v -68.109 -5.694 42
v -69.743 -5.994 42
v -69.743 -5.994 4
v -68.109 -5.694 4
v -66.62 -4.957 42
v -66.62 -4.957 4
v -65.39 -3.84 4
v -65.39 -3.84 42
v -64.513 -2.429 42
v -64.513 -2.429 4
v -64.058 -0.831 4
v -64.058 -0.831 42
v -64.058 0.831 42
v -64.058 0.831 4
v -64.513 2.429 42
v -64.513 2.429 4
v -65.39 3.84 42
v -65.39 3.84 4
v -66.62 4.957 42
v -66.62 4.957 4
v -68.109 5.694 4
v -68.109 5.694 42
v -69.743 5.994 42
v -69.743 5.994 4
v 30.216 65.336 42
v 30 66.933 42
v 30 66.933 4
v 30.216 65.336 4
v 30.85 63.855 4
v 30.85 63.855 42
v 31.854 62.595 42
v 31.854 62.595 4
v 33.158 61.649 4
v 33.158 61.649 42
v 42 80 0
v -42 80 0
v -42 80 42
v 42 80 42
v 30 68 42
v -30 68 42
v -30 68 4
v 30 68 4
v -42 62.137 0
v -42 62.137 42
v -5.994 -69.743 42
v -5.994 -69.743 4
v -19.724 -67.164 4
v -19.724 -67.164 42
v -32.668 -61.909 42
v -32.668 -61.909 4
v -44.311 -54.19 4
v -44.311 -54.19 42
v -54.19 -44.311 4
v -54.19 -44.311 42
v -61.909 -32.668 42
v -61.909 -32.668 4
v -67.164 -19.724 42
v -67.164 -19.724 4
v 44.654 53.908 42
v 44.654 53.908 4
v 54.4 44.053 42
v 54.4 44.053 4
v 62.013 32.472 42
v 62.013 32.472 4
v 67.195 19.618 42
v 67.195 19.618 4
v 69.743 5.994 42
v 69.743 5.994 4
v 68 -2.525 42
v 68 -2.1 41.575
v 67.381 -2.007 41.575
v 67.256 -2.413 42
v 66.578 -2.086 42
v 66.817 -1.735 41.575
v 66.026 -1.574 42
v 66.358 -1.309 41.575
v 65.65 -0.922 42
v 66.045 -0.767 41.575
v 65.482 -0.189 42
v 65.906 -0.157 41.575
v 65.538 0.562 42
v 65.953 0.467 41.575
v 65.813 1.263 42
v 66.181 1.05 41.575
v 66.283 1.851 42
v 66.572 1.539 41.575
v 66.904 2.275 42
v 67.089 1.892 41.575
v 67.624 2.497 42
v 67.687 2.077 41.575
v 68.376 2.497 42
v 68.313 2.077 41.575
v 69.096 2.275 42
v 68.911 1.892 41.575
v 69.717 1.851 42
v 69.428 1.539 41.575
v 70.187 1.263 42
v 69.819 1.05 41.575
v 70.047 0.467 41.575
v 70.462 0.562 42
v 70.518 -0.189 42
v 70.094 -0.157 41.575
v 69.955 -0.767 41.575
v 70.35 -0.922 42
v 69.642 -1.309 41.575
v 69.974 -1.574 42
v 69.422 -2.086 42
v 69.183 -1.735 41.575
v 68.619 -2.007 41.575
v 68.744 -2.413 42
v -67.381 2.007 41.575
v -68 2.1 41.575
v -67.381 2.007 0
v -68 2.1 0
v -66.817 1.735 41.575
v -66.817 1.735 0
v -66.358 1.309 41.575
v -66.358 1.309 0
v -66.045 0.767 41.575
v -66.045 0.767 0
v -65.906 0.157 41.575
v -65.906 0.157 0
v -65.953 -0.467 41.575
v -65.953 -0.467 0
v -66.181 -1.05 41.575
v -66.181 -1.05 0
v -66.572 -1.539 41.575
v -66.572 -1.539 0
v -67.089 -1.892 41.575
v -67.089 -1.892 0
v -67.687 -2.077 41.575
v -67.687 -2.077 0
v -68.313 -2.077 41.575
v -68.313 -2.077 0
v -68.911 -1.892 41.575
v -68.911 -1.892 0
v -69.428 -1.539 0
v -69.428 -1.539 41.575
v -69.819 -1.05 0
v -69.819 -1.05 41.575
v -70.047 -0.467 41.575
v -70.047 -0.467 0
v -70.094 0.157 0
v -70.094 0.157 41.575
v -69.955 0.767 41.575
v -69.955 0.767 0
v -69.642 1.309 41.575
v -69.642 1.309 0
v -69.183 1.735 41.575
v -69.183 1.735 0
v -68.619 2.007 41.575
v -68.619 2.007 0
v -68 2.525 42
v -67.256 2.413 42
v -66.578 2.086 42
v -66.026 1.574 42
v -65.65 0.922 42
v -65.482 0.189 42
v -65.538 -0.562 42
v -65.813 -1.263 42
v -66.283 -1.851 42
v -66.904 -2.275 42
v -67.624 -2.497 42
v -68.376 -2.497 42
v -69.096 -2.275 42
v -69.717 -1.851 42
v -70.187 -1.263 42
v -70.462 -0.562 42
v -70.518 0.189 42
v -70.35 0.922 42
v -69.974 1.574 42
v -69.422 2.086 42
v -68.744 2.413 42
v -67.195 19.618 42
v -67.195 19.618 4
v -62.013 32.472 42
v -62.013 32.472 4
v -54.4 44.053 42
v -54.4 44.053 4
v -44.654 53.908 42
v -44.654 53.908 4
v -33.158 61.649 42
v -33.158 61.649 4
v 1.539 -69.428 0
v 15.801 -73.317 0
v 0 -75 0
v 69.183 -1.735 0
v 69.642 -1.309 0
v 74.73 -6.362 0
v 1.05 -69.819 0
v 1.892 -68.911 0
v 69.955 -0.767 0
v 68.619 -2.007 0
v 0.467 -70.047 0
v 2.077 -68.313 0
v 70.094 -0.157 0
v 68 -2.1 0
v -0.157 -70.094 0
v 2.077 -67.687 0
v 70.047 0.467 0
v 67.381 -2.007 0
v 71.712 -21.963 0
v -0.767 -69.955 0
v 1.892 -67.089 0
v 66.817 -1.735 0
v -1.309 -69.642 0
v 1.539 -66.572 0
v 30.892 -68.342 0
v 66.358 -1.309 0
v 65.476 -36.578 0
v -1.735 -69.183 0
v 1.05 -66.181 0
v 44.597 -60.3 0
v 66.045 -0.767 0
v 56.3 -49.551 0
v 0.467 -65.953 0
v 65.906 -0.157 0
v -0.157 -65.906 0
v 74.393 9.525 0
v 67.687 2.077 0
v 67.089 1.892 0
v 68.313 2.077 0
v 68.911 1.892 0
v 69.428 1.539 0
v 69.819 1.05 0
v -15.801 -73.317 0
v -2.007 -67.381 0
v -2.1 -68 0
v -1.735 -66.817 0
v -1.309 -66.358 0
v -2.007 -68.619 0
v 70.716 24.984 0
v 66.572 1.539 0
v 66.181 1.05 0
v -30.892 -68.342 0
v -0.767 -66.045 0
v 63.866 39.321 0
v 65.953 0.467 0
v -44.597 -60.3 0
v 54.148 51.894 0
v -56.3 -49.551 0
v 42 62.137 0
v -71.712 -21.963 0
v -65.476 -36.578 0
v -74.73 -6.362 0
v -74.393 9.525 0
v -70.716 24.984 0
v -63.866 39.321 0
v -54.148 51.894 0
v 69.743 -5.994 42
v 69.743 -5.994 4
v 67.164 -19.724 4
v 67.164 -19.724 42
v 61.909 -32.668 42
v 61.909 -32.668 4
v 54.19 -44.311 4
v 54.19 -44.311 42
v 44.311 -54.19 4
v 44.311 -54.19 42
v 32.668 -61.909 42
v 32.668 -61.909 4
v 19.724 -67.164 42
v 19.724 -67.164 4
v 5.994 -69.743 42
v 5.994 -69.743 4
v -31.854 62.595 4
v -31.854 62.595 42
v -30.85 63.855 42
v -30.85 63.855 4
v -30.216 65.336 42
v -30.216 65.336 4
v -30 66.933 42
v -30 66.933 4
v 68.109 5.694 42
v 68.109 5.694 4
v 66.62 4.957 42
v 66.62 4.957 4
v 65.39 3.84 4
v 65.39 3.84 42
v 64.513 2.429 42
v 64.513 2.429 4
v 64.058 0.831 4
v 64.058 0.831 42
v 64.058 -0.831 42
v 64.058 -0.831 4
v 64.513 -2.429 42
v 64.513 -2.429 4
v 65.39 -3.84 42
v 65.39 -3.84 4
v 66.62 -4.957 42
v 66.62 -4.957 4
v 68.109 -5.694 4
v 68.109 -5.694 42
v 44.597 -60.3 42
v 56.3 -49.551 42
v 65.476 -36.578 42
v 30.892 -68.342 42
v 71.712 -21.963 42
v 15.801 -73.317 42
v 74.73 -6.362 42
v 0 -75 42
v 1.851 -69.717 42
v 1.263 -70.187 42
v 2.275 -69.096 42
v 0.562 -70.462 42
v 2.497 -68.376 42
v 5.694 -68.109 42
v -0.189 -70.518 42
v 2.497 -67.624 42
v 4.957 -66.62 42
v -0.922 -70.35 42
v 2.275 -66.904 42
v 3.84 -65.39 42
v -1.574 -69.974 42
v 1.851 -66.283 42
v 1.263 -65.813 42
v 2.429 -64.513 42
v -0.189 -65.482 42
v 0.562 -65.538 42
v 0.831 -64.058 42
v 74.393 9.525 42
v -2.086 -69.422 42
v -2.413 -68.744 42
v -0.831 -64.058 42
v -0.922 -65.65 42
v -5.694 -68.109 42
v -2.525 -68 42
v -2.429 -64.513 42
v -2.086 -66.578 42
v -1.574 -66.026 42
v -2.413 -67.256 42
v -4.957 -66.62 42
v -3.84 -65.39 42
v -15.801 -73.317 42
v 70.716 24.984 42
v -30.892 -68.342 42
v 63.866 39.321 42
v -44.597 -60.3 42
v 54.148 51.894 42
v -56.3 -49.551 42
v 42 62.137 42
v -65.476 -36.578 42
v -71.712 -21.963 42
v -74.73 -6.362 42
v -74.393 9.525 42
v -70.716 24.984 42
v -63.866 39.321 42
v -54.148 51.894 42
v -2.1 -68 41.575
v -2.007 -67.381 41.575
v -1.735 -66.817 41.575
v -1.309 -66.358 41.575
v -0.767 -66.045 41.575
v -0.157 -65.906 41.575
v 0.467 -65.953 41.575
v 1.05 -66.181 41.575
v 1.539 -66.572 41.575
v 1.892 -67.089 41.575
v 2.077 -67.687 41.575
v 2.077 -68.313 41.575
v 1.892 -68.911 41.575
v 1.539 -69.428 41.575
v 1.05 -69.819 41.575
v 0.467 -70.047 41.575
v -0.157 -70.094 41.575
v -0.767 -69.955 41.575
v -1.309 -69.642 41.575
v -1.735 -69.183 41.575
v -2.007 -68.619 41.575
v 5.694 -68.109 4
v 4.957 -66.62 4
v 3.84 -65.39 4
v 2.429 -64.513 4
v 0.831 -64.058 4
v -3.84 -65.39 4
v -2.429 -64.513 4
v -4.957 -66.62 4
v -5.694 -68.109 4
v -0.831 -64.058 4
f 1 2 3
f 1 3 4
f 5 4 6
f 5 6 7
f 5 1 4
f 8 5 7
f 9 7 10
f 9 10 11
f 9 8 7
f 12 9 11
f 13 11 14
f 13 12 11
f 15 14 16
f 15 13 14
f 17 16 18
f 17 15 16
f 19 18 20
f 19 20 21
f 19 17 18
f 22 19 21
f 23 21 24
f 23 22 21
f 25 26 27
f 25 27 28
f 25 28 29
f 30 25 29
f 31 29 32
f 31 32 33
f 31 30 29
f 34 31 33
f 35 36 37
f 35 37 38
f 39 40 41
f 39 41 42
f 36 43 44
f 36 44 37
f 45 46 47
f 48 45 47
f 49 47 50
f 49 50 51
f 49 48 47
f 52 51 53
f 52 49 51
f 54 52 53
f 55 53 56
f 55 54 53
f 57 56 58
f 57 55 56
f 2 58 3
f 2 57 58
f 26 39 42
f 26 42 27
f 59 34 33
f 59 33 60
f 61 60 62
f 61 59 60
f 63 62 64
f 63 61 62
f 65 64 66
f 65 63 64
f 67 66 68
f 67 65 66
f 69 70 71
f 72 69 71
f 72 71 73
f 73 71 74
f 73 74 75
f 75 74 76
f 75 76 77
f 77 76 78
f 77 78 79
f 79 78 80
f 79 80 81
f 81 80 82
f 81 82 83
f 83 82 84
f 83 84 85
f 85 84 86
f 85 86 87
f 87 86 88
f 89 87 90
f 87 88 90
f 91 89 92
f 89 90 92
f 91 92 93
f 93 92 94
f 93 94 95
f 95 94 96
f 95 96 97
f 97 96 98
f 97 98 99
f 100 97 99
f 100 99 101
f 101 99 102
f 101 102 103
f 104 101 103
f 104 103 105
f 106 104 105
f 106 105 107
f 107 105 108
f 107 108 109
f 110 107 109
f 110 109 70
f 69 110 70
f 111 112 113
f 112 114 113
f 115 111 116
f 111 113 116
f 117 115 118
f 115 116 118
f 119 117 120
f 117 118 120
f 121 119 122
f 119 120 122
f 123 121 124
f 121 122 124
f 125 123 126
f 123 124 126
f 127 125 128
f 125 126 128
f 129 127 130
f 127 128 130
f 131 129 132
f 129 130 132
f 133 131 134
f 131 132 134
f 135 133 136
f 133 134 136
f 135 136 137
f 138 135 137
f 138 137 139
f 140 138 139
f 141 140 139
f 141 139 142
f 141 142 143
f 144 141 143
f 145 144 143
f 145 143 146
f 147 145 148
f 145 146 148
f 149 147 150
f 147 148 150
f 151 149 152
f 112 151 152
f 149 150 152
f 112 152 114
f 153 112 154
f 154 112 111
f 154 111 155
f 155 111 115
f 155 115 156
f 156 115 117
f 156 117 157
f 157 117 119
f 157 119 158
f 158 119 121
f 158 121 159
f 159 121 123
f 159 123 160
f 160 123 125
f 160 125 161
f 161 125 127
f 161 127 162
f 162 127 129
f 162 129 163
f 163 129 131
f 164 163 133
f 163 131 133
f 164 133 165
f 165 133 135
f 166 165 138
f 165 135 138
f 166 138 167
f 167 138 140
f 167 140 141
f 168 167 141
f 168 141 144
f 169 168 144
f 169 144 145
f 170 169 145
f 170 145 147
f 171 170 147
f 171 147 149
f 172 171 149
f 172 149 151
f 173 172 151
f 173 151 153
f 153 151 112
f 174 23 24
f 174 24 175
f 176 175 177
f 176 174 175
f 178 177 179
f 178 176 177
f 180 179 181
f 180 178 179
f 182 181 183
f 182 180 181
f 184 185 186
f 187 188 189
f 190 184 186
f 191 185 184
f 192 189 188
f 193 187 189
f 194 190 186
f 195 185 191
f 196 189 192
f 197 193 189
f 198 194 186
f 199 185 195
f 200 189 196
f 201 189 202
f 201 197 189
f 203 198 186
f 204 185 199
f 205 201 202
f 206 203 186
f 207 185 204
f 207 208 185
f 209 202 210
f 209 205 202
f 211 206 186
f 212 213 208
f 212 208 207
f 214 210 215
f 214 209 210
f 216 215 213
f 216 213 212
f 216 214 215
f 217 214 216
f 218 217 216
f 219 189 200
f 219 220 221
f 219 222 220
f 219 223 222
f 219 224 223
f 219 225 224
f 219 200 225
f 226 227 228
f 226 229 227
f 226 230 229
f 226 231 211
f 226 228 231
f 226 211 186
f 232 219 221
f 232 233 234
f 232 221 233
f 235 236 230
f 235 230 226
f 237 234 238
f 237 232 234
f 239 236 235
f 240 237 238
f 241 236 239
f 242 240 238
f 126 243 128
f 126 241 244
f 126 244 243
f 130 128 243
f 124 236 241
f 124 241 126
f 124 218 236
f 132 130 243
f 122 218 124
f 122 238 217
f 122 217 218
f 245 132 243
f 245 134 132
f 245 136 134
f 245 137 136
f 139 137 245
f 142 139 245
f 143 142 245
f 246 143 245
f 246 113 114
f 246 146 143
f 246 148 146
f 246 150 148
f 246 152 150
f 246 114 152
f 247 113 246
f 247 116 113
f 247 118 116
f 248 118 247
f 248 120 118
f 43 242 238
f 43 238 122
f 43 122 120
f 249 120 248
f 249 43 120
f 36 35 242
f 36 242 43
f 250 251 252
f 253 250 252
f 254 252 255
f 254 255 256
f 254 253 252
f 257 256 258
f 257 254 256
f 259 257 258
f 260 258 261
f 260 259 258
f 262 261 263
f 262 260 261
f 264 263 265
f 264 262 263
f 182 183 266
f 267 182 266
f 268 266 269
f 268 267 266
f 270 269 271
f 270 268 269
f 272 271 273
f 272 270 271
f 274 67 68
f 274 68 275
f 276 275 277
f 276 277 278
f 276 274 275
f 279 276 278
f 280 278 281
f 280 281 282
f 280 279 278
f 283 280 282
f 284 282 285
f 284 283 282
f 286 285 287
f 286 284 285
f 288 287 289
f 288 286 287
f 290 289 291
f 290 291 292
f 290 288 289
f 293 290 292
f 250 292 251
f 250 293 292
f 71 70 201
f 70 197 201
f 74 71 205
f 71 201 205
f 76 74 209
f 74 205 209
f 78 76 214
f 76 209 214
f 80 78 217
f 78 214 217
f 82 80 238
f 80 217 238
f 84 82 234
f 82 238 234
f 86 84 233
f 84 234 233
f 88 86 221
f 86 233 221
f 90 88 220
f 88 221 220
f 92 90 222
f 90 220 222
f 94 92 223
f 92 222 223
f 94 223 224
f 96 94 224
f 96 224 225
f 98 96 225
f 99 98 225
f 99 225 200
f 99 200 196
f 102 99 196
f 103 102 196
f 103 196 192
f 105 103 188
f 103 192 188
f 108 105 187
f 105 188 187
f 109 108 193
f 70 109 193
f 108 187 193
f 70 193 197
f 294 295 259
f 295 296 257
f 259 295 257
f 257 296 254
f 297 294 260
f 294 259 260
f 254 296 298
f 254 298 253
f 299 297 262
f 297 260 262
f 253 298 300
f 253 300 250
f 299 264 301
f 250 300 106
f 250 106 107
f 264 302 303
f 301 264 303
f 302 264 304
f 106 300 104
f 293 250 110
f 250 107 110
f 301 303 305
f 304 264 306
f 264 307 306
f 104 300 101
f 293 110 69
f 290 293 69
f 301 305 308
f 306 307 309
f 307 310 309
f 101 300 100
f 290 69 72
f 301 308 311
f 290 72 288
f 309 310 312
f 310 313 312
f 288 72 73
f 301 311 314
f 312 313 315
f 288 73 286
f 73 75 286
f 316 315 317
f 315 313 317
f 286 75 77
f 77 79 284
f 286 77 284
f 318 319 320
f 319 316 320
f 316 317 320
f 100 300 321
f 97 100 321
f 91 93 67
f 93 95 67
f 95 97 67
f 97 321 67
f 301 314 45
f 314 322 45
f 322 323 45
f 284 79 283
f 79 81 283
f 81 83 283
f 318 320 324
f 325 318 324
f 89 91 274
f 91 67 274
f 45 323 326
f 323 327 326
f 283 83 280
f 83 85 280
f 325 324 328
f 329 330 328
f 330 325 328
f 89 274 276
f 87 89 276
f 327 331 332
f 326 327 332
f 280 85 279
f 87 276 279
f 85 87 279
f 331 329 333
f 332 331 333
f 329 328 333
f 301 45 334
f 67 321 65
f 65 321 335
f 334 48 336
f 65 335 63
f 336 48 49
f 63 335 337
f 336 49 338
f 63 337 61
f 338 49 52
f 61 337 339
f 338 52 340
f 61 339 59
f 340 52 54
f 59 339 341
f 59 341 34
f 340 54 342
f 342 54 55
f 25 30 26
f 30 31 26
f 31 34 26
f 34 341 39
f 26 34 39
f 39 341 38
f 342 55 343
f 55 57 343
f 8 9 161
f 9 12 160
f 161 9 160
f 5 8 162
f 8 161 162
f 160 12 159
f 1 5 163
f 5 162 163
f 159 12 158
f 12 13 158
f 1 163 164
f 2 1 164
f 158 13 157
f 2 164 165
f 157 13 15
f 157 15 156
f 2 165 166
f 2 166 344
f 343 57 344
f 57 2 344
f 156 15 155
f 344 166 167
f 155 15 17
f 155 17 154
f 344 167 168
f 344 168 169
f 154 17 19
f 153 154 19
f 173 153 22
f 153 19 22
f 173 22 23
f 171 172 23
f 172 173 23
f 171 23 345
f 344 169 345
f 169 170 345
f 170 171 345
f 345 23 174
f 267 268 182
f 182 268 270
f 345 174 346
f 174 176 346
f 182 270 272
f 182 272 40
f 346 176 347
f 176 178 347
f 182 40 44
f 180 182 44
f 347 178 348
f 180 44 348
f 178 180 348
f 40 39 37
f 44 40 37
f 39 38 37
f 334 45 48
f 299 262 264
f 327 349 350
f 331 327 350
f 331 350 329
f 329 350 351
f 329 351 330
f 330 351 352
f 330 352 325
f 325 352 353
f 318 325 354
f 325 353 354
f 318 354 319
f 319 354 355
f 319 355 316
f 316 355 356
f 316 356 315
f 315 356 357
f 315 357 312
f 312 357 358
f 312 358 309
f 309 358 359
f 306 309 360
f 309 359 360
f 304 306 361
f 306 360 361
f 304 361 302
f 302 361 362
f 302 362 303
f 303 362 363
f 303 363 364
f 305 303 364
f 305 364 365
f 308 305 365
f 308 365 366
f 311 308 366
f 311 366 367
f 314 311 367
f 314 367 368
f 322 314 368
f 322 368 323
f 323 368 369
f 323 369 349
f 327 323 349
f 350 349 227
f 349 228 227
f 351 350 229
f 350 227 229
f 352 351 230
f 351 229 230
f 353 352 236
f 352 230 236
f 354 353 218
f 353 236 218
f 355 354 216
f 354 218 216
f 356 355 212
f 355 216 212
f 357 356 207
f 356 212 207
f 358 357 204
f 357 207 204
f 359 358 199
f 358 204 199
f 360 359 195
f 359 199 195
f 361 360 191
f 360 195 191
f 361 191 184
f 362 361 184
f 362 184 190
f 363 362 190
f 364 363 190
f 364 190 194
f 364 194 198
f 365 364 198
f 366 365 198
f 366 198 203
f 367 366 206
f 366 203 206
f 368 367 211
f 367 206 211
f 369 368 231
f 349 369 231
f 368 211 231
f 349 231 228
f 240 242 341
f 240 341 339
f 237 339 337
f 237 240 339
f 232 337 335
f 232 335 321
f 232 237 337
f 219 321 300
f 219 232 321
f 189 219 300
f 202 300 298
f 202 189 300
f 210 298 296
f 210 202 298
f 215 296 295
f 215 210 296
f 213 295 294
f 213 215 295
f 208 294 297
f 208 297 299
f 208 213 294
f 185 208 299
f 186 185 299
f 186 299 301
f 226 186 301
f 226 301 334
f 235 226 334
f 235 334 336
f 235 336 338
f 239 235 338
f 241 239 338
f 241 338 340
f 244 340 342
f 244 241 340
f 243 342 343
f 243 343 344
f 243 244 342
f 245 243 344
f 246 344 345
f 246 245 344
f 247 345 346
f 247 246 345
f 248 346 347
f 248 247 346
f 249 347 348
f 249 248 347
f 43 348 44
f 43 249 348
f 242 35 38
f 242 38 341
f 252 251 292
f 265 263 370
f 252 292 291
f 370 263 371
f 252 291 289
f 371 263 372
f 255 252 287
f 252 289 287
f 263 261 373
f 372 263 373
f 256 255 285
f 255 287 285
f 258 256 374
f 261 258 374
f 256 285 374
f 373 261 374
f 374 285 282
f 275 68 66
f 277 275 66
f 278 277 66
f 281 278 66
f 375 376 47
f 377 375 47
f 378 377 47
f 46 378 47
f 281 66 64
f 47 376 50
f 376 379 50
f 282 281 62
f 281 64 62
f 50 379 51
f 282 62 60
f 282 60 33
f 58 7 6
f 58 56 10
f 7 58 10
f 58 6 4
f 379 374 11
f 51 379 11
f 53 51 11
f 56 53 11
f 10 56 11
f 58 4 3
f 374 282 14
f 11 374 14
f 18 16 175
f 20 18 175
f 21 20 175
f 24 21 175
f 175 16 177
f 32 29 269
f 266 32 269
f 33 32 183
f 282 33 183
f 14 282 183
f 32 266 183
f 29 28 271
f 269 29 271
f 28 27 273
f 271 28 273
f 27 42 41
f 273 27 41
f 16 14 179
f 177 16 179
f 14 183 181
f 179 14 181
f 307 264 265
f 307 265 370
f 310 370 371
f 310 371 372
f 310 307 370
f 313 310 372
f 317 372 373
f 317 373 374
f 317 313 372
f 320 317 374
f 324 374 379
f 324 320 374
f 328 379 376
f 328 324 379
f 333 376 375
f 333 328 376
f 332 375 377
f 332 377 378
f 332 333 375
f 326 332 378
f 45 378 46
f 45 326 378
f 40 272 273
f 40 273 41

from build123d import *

# Parameters (mm, degrees)
EXTRUDE_1_DEPTH              = 42
CUT_EXTRUDE_1_DEPTH          = 38
HOLE_WIZARD_M5_1_D           = 4.2
HOLE_WIZARD_M5_1_CSINK_D     = 5.05
HOLE_WIZARD_M5_1_CSINK_ANGLE = 90
PATTERN_CIRCULAR_1_COUNT     = 4


with BuildPart() as part:
    # 草图1 → 凸台-拉伸1 (new body)
    with BuildSketch(Plane.XY):
        with BuildLine():
            Line((-42, 62.136945532), (-42, 80))
            Line((-42, 80), (42, 80))
            Line((42, 80), (42, 62.136945532))
            ThreePointArc((42, 62.136945532), (0, -75), (-42, 62.136945532))
        make_face()
    extrude(amount=EXTRUDE_1_DEPTH)

    # 草图2 → 切除-拉伸1 (cut)
    with BuildSketch(Plane.XY.offset(42)):
        with BuildLine():
            Line((-30, 66.932802123), (-30, 68))
            Line((-30, 68), (30, 68))
            Line((30, 68), (30, 66.932802123))
            ThreePointArc((30, 66.932802123), (30.849629548, 63.854867066), (33.157894737, 61.648633534))
            ThreePointArc((33.157894737, 61.648633534), (58.493479839, 38.451434516), (69.742857143, 5.994487263))
            ThreePointArc((69.742857143, 5.994487263), (64, 0), (69.742857143, -5.994487263))
            ThreePointArc((69.742857143, -5.994487263), (49.497474683, -49.497474683), (5.994487263, -69.742857143))
            ThreePointArc((5.994487263, -69.742857143), (0, -64), (-5.994487263, -69.742857143))
            ThreePointArc((-5.994487263, -69.742857143), (-49.497474683, -49.497474683), (-69.742857143, -5.994487263))
            ThreePointArc((-69.742857143, -5.994487263), (-64, 0), (-69.742857143, 5.994487263))
            ThreePointArc((-69.742857143, 5.994487263), (-58.493479839, 38.451434516), (-33.157894737, 61.648633534))
            ThreePointArc((-33.157894737, 61.648633534), (-30.849629548, 63.854867066), (-30, 66.932802123))
        make_face()
    extrude(amount=-CUT_EXTRUDE_1_DEPTH, mode=Mode.SUBTRACT)

    # M5 螺纹孔1 (through all)
    with Locations(Plane.XY.offset(42)):
        with Locations((0, -68)):
            hole_wizard_m5_1 = CounterSinkHole(HOLE_WIZARD_M5_1_D / 2, HOLE_WIZARD_M5_1_CSINK_D / 2, counter_sink_angle=HOLE_WIZARD_M5_1_CSINK_ANGLE)

    # 阵列(圆周)1: M5 螺纹孔1 ×4 about axis, 1 skipped
    pattern_circular_1_axis = Axis((0, 0, 0), (0, 0, -1))
    add([hole_wizard_m5_1.rotate(pattern_circular_1_axis, i * 360 / PATTERN_CIRCULAR_1_COUNT) for i in range(1, PATTERN_CIRCULAR_1_COUNT) if i not in (2,)], mode=Mode.SUBTRACT)


solid = part.part
